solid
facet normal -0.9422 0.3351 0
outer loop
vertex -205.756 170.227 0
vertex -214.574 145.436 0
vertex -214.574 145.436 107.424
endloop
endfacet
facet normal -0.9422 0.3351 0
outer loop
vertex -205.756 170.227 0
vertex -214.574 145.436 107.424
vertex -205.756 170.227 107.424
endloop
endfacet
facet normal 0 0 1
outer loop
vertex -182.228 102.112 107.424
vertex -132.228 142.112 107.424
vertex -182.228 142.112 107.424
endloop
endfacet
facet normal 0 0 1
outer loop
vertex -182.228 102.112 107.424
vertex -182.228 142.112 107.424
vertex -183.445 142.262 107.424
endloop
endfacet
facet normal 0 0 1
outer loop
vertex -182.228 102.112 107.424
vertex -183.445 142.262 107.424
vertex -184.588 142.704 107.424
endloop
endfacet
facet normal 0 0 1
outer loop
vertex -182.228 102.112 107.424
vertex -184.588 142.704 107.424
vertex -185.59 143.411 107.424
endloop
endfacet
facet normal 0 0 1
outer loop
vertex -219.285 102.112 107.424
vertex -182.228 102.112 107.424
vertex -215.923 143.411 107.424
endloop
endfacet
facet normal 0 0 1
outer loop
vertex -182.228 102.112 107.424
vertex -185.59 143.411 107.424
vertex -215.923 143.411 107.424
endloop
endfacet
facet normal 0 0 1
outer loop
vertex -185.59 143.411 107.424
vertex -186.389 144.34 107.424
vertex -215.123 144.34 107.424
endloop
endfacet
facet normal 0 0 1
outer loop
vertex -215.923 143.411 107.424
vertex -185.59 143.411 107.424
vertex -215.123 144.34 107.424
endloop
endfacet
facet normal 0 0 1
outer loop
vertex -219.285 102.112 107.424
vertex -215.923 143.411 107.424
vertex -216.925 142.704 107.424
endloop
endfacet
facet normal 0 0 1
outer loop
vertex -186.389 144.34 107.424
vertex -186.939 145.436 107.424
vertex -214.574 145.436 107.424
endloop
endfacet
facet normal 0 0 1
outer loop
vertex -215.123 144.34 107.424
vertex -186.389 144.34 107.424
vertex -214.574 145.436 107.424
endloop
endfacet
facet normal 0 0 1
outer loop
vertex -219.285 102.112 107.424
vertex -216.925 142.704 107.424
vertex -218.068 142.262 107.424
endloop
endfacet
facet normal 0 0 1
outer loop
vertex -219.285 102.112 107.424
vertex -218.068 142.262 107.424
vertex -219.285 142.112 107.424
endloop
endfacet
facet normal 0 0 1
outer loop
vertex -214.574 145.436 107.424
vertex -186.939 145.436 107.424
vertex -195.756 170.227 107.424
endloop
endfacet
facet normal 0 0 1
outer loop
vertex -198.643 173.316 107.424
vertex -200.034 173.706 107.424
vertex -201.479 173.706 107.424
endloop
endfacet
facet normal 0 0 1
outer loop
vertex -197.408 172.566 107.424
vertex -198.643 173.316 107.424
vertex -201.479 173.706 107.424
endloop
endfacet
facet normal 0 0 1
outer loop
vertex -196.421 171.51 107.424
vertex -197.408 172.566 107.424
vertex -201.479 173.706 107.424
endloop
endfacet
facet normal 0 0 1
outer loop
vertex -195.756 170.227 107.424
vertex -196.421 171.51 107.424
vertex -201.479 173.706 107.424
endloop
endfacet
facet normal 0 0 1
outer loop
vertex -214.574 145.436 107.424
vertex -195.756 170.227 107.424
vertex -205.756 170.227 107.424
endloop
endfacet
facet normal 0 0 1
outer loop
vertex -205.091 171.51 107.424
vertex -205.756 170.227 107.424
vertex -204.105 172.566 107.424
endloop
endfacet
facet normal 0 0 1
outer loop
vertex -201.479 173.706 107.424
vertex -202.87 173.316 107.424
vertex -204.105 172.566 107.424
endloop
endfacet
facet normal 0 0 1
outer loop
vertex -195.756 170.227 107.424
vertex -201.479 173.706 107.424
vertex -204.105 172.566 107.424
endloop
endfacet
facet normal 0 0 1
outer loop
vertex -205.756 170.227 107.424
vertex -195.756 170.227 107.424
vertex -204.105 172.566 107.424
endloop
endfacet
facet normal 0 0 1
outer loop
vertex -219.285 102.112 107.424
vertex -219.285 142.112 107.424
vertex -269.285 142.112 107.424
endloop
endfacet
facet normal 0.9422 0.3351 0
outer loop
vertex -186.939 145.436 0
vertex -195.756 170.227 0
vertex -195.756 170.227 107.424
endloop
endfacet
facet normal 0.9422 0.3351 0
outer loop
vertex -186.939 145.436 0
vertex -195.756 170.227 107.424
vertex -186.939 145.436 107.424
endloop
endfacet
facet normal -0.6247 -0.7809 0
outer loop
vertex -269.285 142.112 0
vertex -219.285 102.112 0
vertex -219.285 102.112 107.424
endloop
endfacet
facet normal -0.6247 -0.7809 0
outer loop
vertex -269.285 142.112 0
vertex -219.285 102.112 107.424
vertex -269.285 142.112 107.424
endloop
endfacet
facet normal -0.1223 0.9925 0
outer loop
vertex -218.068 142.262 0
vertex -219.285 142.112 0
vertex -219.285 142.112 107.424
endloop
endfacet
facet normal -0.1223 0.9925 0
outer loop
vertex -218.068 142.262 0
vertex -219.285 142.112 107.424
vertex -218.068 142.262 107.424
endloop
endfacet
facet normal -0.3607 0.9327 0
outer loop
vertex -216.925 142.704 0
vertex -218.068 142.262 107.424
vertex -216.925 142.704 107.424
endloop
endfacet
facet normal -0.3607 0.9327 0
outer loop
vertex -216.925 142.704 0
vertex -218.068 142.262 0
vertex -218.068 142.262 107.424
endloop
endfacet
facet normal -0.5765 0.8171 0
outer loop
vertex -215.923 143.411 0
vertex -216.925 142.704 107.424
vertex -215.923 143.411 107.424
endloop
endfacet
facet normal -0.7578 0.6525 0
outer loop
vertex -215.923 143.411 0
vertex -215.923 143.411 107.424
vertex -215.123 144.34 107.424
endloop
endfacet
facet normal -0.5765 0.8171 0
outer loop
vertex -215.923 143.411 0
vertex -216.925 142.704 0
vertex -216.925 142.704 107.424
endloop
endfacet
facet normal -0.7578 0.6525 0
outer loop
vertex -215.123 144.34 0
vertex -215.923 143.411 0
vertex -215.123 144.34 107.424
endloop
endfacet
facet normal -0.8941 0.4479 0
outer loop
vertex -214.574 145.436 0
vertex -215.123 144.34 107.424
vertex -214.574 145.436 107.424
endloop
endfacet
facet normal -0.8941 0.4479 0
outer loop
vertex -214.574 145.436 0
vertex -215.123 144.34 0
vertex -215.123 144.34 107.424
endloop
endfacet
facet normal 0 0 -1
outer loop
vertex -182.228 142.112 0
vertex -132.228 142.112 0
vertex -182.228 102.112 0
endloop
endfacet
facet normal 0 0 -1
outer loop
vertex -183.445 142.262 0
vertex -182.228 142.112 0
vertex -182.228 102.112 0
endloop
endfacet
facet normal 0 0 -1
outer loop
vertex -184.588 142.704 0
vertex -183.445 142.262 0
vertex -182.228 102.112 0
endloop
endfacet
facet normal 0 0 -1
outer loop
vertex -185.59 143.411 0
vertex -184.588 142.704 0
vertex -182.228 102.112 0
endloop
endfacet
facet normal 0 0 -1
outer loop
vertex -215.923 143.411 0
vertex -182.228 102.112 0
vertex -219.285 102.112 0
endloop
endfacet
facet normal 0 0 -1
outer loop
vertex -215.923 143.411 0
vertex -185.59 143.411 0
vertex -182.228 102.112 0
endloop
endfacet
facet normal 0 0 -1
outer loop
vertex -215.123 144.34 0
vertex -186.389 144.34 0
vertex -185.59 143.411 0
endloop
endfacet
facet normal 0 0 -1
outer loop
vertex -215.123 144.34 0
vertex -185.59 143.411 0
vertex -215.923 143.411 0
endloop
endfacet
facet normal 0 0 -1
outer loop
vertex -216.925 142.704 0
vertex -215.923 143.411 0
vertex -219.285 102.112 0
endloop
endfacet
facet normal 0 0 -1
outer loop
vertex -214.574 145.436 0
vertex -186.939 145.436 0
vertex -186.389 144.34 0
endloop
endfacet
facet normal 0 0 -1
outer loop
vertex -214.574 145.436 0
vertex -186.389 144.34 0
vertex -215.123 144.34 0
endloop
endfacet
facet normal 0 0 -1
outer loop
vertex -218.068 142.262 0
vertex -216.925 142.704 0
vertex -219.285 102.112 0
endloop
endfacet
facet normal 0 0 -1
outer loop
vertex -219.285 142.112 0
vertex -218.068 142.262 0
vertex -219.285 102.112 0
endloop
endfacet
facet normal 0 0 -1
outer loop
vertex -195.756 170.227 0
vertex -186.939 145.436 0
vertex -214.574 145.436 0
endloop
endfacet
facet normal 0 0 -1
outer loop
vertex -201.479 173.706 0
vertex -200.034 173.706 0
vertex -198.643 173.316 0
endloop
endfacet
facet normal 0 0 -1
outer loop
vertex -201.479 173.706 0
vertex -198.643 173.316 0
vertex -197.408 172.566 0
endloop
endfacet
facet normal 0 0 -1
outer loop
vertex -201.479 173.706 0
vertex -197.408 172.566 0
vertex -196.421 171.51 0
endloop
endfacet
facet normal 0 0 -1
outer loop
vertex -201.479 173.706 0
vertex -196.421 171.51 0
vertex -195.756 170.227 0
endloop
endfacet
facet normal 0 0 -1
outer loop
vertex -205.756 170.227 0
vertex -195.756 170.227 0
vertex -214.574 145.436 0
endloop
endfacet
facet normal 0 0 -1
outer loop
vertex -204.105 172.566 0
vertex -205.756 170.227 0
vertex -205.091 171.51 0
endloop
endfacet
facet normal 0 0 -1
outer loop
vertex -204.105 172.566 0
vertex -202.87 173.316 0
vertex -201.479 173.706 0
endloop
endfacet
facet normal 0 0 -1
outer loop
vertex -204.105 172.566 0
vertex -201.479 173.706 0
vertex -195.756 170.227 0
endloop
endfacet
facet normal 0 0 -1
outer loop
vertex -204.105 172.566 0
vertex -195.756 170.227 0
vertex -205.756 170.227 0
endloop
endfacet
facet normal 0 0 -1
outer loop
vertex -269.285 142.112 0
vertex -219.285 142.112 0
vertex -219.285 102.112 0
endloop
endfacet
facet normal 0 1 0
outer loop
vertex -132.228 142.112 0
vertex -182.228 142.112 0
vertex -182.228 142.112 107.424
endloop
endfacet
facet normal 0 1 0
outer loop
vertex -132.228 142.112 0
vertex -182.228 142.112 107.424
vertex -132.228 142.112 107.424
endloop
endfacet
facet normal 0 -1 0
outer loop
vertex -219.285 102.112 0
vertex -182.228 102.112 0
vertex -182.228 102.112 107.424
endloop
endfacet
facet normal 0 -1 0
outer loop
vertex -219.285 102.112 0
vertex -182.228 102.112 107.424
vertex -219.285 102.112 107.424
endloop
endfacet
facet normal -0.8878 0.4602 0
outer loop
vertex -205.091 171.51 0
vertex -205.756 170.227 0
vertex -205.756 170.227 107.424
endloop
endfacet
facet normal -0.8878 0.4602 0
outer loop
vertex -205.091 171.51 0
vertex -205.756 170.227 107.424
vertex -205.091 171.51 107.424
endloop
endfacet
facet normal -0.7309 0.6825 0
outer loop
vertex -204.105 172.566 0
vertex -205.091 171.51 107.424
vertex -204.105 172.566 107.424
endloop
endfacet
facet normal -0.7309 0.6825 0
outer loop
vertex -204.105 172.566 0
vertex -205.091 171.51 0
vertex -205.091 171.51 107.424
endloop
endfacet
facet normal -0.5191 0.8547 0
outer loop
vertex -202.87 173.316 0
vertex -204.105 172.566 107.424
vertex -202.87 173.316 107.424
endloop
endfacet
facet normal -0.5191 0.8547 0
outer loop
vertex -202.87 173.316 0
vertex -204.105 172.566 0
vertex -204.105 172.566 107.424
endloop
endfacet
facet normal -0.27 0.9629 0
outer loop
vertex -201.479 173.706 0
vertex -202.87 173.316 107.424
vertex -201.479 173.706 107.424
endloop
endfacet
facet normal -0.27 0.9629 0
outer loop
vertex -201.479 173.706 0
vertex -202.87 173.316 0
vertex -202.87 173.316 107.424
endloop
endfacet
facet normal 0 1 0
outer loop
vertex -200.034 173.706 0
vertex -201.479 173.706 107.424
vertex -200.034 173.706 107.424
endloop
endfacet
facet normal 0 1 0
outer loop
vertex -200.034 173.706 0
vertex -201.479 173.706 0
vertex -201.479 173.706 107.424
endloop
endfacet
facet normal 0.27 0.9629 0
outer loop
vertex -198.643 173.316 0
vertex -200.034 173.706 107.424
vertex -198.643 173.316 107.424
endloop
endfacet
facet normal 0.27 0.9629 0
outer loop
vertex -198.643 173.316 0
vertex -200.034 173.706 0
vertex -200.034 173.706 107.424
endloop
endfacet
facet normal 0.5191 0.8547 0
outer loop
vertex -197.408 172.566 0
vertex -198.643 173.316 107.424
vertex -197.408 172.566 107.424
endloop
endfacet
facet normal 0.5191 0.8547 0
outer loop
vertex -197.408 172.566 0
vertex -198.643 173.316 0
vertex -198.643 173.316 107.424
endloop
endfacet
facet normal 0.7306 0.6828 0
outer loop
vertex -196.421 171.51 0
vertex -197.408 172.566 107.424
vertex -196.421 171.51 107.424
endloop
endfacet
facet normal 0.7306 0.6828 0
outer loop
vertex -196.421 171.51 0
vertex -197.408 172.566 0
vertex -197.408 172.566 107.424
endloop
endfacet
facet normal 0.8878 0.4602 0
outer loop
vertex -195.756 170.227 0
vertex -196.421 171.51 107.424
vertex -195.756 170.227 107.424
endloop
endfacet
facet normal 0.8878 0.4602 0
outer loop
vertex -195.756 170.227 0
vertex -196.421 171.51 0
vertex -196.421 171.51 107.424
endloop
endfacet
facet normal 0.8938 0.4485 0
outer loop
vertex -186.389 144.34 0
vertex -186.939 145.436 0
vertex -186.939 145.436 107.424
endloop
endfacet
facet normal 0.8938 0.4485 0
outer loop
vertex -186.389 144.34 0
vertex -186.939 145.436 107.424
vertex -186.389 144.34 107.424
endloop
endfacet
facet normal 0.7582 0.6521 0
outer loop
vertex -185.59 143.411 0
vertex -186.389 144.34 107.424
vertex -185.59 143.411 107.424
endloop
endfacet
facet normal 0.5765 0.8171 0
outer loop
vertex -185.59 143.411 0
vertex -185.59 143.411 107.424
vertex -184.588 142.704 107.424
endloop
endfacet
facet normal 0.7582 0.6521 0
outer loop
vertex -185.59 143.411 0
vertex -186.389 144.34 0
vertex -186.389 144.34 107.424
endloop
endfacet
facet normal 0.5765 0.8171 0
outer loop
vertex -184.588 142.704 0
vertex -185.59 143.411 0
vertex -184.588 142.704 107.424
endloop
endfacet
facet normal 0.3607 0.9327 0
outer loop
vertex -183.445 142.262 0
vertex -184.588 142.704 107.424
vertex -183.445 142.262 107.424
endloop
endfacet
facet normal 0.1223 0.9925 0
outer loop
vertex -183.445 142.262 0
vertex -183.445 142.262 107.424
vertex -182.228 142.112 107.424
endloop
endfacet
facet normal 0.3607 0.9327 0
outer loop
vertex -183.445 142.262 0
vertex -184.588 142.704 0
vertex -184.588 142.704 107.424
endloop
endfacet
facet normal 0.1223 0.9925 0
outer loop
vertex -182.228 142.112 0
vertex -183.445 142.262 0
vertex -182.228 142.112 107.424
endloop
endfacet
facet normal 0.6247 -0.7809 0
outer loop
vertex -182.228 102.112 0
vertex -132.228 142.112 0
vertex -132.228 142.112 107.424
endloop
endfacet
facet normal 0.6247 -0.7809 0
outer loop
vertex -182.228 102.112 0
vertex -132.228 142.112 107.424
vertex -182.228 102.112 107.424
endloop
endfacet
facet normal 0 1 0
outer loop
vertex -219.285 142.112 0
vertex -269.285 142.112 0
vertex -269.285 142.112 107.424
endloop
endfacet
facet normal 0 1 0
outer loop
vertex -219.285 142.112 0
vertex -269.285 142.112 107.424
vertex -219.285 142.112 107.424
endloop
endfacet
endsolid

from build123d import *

# Parameters (mm, degrees)
BOSS_EXTRUDE1_DEPTH = 107.424


with BuildPart() as part:
    # Sketch2 → Boss-Extrude1 (new body)
    with BuildSketch(Plane.XY):
        with BuildLine():
            Line((-269.284845729, 142.112072029), (-219.284845729, 142.112072029))
            ThreePointArc((-219.284845729, 142.112072029), (-216.401959188, 143.026859037), (-214.573963508, 145.436485952))
            Line((-214.573963508, 145.436485952), (-205.756404805, 170.226904714))
            ThreePointArc((-205.756404805, 170.226904714), (-200.756404805, 173.755345637), (-195.756404805, 170.226904714))
            Line((-195.756404805, 170.226904714), (-186.938846102, 145.436485952))
            ThreePointArc((-186.938846102, 145.436485952), (-185.110850422, 143.026859037), (-182.227963882, 142.112072029))
            Line((-182.227963882, 142.112072029), (-132.227963882, 142.112072029))
            Line((-132.227963882, 142.112072029), (-182.227963882, 102.112072029))
            Line((-182.227963882, 102.112072029), (-219.284845729, 102.112072029))
            Line((-219.284845729, 102.112072029), (-269.284845729, 142.112072029))
        make_face()
    extrude(amount=BOSS_EXTRUDE1_DEPTH)


solid = part.part
